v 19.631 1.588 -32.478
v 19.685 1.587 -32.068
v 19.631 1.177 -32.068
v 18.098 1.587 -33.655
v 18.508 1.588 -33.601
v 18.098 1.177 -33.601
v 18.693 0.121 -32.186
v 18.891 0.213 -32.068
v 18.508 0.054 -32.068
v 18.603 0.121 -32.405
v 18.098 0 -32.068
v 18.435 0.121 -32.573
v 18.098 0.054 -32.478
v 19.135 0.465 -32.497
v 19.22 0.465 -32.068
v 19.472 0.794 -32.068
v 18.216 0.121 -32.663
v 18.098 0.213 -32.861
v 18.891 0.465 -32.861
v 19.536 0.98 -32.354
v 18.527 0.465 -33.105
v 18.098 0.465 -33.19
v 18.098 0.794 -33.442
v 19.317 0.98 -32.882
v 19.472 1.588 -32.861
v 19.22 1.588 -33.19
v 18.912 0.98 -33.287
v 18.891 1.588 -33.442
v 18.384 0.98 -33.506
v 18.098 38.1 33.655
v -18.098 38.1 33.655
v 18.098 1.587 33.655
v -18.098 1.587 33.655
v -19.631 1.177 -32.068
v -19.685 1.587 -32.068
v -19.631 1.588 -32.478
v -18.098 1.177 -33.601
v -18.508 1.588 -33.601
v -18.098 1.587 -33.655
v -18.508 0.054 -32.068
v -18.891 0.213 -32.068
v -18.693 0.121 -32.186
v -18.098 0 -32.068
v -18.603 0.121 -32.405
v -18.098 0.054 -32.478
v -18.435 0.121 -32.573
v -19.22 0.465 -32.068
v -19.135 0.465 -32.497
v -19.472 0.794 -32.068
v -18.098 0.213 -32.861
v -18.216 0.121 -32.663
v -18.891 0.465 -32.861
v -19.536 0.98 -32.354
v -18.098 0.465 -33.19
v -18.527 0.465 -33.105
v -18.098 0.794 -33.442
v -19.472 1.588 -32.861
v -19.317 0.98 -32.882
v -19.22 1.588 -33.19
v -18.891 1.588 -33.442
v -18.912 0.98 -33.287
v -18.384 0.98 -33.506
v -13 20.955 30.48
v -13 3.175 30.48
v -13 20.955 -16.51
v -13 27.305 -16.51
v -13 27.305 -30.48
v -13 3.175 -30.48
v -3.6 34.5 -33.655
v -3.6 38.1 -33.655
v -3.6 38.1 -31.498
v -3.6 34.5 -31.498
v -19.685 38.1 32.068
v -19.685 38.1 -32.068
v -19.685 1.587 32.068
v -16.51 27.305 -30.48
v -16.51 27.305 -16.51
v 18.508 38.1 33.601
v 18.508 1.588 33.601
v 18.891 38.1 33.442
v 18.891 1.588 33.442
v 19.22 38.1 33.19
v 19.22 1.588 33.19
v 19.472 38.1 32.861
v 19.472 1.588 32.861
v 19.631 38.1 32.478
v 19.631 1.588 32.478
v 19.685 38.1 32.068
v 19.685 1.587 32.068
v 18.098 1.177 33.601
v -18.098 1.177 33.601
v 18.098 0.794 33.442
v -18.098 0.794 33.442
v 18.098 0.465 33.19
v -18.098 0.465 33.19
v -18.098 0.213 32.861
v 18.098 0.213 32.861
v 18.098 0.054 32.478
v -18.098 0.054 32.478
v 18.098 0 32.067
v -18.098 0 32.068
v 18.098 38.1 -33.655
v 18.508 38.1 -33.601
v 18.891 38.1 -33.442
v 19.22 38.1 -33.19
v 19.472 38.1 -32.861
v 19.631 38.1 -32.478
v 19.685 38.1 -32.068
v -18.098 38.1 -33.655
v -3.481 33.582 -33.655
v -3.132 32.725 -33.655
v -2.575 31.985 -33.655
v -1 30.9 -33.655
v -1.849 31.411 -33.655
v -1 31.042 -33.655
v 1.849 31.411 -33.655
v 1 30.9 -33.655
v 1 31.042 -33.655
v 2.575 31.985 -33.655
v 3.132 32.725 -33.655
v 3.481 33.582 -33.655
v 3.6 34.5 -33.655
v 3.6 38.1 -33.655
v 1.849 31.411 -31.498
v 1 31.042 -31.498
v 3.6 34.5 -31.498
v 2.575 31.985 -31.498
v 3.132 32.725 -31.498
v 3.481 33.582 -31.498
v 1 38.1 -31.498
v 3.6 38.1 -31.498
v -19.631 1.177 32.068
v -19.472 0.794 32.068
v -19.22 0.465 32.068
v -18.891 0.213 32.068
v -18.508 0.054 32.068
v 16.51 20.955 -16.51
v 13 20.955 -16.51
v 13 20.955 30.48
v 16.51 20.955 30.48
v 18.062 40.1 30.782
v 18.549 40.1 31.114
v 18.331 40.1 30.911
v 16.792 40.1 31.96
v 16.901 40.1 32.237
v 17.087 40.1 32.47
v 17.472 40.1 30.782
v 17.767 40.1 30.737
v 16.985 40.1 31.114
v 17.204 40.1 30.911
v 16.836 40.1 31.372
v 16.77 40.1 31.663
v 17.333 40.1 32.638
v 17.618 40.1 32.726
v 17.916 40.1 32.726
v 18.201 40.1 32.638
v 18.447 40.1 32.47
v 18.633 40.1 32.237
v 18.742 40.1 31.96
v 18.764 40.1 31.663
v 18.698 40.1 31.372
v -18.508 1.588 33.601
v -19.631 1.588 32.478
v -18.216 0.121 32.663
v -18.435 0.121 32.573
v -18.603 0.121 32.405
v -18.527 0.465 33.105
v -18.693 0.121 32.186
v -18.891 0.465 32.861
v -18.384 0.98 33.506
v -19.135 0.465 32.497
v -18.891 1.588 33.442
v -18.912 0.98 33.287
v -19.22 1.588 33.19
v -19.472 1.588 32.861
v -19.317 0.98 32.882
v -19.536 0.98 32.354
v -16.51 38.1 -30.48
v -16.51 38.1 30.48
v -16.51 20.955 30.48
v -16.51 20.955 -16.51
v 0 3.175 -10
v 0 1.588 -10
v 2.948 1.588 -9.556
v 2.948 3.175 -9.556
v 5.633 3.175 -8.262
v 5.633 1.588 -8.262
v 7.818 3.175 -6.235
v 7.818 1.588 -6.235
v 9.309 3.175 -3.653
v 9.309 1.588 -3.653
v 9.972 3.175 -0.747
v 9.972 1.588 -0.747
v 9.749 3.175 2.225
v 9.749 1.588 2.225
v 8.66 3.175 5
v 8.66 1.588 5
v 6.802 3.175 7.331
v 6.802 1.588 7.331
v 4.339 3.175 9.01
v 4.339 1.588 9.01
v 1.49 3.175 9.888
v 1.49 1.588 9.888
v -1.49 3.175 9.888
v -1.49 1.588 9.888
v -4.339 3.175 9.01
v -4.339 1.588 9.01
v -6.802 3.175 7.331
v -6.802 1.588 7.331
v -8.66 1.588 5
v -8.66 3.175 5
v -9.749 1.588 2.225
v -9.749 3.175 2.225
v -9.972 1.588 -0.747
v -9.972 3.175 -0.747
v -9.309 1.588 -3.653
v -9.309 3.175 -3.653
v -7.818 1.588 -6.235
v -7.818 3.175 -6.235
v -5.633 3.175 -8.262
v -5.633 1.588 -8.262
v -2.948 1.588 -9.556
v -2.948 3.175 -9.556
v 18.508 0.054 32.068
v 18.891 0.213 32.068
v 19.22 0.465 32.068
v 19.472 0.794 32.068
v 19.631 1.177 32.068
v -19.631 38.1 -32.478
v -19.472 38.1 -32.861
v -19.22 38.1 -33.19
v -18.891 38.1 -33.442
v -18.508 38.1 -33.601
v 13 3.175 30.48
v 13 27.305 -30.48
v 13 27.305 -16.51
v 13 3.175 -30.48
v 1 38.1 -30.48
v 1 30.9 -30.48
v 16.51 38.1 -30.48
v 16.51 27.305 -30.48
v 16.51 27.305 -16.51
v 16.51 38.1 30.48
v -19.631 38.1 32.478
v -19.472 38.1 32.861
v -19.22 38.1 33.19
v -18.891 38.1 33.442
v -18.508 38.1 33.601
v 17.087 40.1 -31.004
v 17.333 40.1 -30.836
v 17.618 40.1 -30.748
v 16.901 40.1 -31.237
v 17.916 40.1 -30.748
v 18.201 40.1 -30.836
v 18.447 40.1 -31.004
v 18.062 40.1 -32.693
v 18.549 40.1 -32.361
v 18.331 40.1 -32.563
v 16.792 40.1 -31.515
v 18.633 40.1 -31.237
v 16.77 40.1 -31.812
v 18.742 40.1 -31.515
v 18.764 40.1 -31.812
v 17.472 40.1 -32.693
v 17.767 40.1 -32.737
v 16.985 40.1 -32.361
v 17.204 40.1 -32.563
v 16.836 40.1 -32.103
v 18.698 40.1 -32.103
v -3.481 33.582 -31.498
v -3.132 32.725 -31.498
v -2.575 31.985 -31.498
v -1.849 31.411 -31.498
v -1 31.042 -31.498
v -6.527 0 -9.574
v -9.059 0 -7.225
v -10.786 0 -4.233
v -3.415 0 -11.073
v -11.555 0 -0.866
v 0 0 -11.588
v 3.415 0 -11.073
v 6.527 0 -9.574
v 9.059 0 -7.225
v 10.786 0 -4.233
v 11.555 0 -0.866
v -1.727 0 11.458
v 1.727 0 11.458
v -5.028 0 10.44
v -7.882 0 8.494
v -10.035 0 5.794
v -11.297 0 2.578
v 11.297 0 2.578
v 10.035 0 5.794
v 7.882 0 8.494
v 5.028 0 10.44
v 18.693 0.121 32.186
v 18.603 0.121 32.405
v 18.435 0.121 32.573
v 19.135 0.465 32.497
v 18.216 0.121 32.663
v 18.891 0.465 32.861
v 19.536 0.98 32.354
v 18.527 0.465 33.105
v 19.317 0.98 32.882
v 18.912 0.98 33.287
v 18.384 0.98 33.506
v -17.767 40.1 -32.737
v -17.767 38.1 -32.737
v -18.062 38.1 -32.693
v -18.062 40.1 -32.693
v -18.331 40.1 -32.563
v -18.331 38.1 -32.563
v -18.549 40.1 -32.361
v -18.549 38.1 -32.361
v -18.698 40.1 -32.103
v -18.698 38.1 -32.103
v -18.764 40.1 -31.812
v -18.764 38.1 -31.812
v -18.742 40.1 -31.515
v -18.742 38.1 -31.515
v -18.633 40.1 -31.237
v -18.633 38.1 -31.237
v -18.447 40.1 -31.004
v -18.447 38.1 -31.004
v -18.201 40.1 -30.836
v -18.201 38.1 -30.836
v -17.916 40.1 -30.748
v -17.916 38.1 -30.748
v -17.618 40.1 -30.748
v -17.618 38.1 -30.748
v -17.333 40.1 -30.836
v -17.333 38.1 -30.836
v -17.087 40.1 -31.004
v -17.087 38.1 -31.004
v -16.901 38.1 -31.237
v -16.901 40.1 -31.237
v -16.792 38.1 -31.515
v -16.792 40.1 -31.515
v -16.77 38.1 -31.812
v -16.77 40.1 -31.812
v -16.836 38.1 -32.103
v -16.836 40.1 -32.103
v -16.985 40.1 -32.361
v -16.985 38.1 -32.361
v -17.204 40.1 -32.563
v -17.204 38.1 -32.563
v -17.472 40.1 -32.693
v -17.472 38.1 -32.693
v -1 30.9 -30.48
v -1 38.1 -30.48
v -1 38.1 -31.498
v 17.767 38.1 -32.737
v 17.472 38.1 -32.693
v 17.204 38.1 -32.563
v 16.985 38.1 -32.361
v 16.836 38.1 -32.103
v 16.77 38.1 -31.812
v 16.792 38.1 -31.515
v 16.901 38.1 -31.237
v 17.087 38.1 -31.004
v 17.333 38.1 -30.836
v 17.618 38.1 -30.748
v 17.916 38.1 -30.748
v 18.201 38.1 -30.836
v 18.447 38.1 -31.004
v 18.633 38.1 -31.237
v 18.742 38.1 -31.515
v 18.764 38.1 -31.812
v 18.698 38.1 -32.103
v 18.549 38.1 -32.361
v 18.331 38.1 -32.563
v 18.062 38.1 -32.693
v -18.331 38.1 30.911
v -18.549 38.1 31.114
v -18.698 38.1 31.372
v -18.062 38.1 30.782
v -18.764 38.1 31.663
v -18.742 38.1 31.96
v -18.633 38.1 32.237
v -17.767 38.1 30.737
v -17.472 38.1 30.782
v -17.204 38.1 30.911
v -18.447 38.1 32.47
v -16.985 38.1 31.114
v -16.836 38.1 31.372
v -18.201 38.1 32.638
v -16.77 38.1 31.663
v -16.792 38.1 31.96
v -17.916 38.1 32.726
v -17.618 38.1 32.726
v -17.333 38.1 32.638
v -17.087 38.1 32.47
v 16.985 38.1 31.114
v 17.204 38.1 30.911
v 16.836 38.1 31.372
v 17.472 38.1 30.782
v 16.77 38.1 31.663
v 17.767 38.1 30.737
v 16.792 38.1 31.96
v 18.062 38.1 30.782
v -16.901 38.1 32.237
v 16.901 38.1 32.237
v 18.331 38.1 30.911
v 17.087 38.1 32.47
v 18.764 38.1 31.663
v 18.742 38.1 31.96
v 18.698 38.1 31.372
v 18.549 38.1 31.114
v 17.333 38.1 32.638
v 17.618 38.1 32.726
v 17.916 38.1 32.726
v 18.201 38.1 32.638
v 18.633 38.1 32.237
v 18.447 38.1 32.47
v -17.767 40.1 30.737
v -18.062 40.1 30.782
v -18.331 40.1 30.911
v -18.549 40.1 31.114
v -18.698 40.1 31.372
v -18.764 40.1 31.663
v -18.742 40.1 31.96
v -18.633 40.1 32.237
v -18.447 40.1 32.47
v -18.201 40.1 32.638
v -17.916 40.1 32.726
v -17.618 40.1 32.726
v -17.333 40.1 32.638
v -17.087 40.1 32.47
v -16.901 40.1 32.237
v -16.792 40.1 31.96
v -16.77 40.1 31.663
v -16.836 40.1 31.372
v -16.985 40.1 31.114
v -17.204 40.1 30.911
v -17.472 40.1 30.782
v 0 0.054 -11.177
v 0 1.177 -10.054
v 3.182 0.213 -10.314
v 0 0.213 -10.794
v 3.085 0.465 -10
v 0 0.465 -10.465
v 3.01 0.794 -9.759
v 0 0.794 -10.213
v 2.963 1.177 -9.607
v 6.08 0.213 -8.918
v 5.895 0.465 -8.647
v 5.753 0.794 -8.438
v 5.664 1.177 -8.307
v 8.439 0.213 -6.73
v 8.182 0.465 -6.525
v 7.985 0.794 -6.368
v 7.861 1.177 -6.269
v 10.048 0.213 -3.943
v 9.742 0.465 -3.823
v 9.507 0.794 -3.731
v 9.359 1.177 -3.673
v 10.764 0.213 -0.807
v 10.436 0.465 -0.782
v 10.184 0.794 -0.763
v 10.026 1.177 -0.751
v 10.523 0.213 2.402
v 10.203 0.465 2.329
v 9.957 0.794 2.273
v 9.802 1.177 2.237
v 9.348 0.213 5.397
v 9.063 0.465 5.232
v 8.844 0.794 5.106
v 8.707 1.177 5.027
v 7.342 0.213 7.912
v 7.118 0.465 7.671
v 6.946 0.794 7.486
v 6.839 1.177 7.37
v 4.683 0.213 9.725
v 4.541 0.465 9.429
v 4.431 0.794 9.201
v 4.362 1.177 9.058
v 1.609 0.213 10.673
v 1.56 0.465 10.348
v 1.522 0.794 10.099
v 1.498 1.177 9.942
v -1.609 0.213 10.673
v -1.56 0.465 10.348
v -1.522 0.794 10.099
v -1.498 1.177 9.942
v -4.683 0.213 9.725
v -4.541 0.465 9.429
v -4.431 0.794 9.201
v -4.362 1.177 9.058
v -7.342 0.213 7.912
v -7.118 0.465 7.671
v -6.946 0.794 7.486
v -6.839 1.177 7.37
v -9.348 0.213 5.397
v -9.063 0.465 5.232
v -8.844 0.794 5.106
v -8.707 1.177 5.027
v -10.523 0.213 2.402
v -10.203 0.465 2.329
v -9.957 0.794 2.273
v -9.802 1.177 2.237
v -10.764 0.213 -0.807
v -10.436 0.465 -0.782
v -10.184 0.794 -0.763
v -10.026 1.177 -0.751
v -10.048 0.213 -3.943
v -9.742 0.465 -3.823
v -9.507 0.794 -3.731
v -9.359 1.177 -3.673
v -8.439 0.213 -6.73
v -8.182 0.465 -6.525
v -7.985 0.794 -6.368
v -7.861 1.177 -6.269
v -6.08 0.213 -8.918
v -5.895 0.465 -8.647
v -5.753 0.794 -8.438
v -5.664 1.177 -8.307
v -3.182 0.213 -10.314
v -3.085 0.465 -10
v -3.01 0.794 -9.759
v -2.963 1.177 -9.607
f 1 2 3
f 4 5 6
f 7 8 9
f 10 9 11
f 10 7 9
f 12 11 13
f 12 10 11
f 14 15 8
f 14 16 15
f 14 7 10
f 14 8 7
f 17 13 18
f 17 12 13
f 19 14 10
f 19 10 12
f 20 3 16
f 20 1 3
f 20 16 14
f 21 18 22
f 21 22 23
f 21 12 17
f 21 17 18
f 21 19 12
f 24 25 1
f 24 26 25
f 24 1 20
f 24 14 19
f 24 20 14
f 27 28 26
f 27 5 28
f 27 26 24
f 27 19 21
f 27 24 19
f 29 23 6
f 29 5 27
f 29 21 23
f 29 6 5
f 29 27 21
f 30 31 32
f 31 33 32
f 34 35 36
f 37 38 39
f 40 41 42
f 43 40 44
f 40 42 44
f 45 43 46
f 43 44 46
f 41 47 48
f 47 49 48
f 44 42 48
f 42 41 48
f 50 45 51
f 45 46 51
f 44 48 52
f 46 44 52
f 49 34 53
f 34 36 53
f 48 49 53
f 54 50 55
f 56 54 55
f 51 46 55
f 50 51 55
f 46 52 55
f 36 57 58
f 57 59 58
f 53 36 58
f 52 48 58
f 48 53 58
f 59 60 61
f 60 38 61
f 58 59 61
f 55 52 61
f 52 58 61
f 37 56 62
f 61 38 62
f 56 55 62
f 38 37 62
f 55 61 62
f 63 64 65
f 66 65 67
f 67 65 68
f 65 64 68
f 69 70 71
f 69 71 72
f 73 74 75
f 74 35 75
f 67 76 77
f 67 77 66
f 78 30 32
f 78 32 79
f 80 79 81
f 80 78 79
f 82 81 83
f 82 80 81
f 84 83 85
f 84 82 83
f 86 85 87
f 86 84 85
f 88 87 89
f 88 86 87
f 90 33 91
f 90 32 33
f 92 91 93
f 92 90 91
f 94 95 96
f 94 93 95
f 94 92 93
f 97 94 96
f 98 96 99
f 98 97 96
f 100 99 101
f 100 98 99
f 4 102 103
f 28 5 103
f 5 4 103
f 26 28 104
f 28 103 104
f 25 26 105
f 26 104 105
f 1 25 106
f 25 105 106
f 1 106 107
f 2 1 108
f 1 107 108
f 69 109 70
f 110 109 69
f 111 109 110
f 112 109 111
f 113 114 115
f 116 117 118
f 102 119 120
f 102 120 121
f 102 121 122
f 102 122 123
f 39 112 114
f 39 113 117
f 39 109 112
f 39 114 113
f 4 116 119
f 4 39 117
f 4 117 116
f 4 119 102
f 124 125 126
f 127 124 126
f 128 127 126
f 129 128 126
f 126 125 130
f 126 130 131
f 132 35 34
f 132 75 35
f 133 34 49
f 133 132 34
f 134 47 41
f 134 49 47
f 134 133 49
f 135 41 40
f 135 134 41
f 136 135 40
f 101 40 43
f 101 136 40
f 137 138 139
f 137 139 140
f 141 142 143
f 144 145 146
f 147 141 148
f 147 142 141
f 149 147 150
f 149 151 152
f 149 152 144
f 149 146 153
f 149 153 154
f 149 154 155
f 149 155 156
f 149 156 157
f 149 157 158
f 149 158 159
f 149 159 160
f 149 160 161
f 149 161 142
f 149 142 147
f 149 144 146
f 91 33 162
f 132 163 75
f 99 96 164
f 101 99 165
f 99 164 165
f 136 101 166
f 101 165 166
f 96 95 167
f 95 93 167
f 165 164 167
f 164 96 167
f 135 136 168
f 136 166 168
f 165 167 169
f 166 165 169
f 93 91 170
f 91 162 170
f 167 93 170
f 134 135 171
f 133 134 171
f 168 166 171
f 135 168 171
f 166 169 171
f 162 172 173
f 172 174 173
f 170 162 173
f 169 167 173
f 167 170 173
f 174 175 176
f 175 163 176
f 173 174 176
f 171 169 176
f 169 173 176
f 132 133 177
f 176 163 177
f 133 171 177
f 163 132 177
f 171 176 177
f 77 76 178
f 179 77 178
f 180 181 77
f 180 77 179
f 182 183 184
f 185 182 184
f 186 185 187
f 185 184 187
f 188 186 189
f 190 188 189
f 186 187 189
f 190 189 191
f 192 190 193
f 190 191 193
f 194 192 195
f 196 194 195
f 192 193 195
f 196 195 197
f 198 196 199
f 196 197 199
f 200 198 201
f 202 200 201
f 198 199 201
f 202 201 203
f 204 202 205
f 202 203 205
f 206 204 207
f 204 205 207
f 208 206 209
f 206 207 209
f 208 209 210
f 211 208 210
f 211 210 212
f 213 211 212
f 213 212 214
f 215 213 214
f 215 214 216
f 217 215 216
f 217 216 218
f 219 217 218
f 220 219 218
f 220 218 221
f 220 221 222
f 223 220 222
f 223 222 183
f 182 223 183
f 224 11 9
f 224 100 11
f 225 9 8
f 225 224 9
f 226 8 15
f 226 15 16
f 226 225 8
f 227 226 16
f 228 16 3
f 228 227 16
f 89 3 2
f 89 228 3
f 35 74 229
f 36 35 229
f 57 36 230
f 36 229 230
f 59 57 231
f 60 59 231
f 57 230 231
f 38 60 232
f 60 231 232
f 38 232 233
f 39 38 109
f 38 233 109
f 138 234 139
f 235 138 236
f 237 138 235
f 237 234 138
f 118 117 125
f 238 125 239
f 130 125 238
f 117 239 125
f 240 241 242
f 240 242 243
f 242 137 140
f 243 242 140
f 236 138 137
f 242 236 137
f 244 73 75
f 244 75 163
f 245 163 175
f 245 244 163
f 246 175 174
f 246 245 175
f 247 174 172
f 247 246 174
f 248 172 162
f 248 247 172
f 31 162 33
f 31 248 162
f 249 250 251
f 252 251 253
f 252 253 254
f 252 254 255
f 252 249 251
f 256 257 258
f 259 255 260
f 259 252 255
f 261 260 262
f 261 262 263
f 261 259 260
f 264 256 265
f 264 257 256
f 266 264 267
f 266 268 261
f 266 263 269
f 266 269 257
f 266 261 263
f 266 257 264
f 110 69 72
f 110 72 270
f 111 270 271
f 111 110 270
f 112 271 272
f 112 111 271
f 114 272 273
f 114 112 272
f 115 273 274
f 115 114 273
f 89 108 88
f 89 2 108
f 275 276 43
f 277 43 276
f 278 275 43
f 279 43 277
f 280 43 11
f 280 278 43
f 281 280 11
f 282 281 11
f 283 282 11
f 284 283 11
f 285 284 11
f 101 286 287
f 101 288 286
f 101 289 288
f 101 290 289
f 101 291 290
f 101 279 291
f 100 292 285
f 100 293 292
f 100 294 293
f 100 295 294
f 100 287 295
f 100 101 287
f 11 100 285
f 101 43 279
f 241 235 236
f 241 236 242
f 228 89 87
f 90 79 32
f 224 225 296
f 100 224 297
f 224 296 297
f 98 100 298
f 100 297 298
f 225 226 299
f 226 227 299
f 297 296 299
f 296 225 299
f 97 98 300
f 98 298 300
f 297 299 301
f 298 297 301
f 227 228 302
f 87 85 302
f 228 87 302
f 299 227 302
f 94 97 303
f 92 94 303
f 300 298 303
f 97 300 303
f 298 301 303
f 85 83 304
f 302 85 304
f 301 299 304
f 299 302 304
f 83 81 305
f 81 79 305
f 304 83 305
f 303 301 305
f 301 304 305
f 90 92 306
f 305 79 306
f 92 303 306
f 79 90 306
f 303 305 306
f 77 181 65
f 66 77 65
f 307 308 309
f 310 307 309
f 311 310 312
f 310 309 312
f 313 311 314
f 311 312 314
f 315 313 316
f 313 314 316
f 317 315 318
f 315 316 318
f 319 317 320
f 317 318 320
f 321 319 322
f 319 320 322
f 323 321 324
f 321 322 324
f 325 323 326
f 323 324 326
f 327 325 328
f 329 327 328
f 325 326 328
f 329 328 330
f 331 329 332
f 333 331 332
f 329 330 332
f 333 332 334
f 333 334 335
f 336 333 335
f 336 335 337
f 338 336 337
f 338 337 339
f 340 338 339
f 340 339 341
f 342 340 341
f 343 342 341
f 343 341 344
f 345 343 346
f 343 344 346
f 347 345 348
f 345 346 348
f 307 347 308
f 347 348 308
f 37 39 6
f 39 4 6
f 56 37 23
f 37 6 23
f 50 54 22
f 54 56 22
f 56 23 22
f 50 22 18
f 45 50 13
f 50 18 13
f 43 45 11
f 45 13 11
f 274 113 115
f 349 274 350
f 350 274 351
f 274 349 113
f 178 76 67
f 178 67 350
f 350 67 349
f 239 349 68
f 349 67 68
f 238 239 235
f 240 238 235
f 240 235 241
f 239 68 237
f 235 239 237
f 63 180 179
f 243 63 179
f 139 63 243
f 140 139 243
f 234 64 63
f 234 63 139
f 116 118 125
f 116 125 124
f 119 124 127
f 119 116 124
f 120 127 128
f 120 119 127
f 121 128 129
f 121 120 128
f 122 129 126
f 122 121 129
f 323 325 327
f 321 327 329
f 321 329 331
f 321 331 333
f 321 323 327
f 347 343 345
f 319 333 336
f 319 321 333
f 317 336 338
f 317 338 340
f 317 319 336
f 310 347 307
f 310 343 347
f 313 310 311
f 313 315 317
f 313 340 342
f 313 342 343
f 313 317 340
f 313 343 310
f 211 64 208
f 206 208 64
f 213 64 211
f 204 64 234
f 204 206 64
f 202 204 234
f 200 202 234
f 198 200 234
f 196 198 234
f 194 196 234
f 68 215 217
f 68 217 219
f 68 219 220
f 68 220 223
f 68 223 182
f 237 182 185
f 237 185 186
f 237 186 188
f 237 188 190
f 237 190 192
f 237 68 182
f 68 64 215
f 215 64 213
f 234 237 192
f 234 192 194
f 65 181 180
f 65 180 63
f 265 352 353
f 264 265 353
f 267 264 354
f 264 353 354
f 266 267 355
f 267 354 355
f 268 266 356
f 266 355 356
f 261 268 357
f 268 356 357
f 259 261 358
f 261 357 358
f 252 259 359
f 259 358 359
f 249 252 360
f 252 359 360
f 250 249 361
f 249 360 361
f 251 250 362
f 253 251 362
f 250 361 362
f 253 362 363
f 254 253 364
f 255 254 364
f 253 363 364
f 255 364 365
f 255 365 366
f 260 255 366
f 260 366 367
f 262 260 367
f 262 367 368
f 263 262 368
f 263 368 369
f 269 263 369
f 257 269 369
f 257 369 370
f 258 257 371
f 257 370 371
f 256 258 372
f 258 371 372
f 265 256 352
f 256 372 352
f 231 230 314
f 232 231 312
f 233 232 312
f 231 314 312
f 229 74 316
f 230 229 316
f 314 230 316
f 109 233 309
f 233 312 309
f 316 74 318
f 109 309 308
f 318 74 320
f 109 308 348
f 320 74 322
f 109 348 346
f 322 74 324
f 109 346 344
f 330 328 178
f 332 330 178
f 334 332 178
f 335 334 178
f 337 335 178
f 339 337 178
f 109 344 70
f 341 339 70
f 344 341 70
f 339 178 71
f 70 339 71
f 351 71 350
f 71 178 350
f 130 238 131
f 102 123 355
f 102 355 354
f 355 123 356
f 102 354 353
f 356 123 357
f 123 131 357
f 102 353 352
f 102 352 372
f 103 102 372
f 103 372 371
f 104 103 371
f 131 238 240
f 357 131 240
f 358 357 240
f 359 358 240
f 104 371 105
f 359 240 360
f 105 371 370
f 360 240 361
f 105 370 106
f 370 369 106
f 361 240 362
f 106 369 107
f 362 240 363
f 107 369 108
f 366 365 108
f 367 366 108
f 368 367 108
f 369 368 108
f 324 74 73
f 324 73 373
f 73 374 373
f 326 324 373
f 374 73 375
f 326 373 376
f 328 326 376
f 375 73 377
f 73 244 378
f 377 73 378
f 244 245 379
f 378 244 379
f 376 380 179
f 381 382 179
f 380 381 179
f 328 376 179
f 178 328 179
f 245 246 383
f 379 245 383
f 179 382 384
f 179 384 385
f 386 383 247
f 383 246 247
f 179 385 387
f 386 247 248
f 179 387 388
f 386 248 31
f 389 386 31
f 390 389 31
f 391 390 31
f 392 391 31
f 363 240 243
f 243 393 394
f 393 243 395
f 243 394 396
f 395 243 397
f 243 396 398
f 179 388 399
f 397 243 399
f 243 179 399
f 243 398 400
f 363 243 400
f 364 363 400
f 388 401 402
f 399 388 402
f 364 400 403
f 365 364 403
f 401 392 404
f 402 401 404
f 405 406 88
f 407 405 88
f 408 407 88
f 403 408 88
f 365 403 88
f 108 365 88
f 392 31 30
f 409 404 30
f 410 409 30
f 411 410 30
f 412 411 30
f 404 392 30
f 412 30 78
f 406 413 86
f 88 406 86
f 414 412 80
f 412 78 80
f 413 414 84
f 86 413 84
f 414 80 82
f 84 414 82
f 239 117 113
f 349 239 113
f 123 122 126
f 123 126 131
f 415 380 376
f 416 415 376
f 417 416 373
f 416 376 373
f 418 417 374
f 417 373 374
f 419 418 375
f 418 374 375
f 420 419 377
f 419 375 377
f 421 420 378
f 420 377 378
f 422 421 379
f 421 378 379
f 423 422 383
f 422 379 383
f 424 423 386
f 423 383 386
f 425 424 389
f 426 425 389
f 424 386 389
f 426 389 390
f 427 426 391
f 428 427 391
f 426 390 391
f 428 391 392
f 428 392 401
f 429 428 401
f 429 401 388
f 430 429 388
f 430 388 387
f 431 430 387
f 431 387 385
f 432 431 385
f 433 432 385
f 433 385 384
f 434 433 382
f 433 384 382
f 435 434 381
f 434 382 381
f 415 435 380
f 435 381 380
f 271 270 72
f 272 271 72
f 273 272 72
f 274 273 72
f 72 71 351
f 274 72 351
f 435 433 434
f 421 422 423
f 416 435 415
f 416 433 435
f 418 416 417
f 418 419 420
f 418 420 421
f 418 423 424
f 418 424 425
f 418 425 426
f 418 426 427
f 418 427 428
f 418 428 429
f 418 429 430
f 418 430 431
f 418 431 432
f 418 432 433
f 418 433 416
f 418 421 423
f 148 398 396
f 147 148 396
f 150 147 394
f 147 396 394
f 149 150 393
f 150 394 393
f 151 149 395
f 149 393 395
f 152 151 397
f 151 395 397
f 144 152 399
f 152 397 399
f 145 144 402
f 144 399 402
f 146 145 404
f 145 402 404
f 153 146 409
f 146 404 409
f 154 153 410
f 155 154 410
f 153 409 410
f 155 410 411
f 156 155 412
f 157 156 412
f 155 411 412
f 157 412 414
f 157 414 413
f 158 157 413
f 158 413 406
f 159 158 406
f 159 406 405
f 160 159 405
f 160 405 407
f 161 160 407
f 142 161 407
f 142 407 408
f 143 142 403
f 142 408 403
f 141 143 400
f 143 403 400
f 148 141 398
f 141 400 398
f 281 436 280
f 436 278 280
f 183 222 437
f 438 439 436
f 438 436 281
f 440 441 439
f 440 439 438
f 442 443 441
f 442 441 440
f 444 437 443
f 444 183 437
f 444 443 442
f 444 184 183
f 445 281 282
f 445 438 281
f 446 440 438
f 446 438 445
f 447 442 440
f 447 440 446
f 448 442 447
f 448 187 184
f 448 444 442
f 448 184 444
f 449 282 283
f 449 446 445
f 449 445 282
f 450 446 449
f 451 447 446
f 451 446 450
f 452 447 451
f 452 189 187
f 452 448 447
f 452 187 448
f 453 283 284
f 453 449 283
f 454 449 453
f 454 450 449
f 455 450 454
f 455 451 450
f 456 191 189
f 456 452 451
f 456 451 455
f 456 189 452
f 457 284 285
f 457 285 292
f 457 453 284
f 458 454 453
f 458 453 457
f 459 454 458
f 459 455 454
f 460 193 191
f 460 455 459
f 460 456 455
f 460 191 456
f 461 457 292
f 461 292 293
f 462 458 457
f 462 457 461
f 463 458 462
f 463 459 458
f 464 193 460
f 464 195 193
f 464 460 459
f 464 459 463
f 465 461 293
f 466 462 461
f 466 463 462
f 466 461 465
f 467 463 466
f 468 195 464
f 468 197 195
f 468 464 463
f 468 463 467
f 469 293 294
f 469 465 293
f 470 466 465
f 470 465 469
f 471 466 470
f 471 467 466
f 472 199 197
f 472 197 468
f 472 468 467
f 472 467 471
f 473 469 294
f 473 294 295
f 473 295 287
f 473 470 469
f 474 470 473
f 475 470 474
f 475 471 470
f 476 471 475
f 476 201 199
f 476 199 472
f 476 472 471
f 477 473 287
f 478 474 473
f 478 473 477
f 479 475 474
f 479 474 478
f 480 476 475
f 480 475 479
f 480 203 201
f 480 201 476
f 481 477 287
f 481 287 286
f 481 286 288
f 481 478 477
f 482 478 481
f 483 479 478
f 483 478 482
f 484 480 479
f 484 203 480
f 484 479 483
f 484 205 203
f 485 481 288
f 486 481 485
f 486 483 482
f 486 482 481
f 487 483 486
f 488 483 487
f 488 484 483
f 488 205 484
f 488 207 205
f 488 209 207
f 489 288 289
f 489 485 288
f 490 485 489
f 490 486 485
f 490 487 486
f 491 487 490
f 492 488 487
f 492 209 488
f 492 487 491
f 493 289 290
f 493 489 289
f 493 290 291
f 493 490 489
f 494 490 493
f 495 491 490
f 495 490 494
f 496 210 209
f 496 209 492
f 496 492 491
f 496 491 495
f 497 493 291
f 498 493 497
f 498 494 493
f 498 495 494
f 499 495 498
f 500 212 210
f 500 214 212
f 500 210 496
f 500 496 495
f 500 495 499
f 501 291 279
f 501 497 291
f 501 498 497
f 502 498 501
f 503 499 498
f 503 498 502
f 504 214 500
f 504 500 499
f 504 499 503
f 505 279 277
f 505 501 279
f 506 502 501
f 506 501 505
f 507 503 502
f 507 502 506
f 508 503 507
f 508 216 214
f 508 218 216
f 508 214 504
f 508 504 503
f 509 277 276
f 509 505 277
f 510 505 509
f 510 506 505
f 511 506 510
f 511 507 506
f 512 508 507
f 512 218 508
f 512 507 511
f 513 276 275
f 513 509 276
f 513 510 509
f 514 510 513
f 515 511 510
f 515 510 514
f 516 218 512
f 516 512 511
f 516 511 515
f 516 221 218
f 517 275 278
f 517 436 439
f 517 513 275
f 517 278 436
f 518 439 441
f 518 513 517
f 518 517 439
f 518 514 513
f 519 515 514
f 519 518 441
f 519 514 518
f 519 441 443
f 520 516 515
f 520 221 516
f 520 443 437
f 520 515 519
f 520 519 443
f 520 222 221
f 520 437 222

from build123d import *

# Parameters (mm, degrees)
SKETCH1_W                     = 33.02
SKETCH1_H                     = 60.96
BASE_DEPTH                    = 3.175
SKETCH2_W                     = 3.51
SKETCH2_H                     = 60.96
BATTERY_SIDES_DEPTH           = 17.78
SKETCH3_W                     = 39.37
SKETCH3_H                     = 67.31
SKETCH3_W_2                   = 33.02
SKETCH3_H_2                   = 60.96
OUTER_CASING_DEPTH            = 38.1
BATTERY_PUSH_HOLE_REACH       = 56.514
SKETCH4_R                     = 10
FILLET1_R                     = 1.5875
SKETCH5_R                     = 1
ALIGNMENT_PEGS_DEPTH          = 2
ATTACHMENT_NARROW_POINT_REACH = 82.785
SKETCH6_W                     = 2
SKETCH6_H                     = 7.2
CUT_EXTRUDE4_DEPTH            = 2.157
SKETCH9_W                     = 3.51
SKETCH9_H                     = 13.97
BOSS_EXTRUDE5_DEPTH           = 6.35


with BuildPart() as part:
    # Sketch1 → Base (new body)
    with BuildSketch(Plane(origin=(0, 0, 0), x_dir=(1, 0, 0), z_dir=(0, 1, 0))):
        Rectangle(SKETCH1_W, SKETCH1_H)
        Polygon((-16.51, 30.48), (16.51, 30.48), (16.51, -30.48), align=None)
    extrude(amount=BASE_DEPTH)

    # Sketch2 → Battery-Sides (add)
    with BuildSketch(Plane(origin=(0, 3.175, 0), x_dir=(1, 0, 0), z_dir=(0, 1, 0))):
        with Locations((-14.755, 0)):
            Rectangle(SKETCH2_W, SKETCH2_H)
        with Locations((14.755, 0)):
            Rectangle(SKETCH2_W, SKETCH2_H)
    extrude(amount=BATTERY_SIDES_DEPTH)

    # Sketch3 → Outer-Casing (add)
    with BuildSketch(Plane.XZ):
        Rectangle(SKETCH3_W, SKETCH3_H)
        Rectangle(SKETCH3_W_2, SKETCH3_H_2, mode=Mode.SUBTRACT)
    extrude(amount=-OUTER_CASING_DEPTH)

    # Sketch4 → Battery-push-hole (cut, up to next)
    with BuildSketch(Plane.XZ, mode=Mode.PRIVATE) as battery_push_hole_sk1:
        with Locations(Location((0, 0, 0), (0, 0, 270))):
            Circle(SKETCH4_R)
    battery_push_hole_tool1 = extrude(battery_push_hole_sk1.sketch, amount=-BATTERY_PUSH_HOLE_REACH, mode=Mode.PRIVATE) & part.part
    add(battery_push_hole_tool1.solids().sort_by_distance((0, 0, 0))[0], mode=Mode.SUBTRACT)

    # Fillet1
    fillet1_edges = [part.edges().sort_by_distance(p)[0] for p in [
        (19.685, 19.05, 33.655),
        (19.685, 19.05, -33.655),
        (-19.685, 19.05, -33.655),
        (-19.685, 19.05, 33.655),
        (19.685, 0, 0),
        (0, 0, 33.655),
        (-19.685, 0, 0),
        (0, 0, -33.655),
        (0, 0, 10),
    ]]
    fillet(fillet1_edges, radius=FILLET1_R)

    # Sketch5 → Alignment Pegs (add)
    with BuildSketch(Plane(origin=(0, 38.1, 0), x_dir=(1, 0, 0), z_dir=(0, 1, 0))):
        with Locations(Location((-17.767235857, 31.737235857, 0), (0, 0, 90))):
            Circle(SKETCH5_R)
        with Locations(Location((-17.767235857, -31.737235857, 0), (0, 0, 90))):
            Circle(SKETCH5_R)
        with Locations(Location((17.767235857, 31.737235857, 0), (0, 0, 90))):
            Circle(SKETCH5_R)
        with Locations(Location((17.767235857, -31.737235857, 0), (0, 0, 90))):
            Circle(SKETCH5_R)
    extrude(amount=ALIGNMENT_PEGS_DEPTH)

    # Sketch6 → Attachment Narrow Point (cut, up to next)
    with BuildSketch(Plane(origin=(0, 0, -33.655), x_dir=(-1, 0, 0), z_dir=(0, 0, -1)), mode=Mode.PRIVATE) as attachment_narrow_point_sk1:
        with Locations((0, 34.5)):
            Rectangle(SKETCH6_W, SKETCH6_H)
    attachment_narrow_point_tool1 = extrude(attachment_narrow_point_sk1.sketch, amount=-ATTACHMENT_NARROW_POINT_REACH, mode=Mode.PRIVATE) & part.part
    add(attachment_narrow_point_tool1.solids().sort_by_distance((0, 34.5, -33.655))[0], mode=Mode.SUBTRACT)

    # Sketch8 → Cut-Extrude4 (cut)
    with BuildSketch(Plane.XY.offset(-33.655)):
        with BuildLine():
            ThreePointArc((1, 31.041676707), (2.877498914, 32.336669235), (3.6, 34.5))
            Line((3.6, 34.5), (3.6, 38.1))
            Line((3.6, 38.1), (1, 38.1))
            Line((1, 38.1), (1, 37.958323293))
            Line((1, 37.958323293), (1, 31.041676707))
        make_face()
        with BuildLine():
            ThreePointArc((-3.6, 34.5), (-2.877498914, 32.336669235), (-1, 31.041676707))
            Line((-1, 31.041676707), (-1, 37.958323293))
            Line((-1, 37.958323293), (-1, 38.1))
            Line((-1, 38.1), (-3.6, 38.1))
            Line((-3.6, 38.1), (-3.6, 34.5))
        make_face()
    extrude(amount=CUT_EXTRUDE4_DEPTH, mode=Mode.SUBTRACT)

    # Sketch9 → Boss-Extrude5 (add)
    with BuildSketch(Plane(origin=(0, 20.955, 0), x_dir=(1, 0, 0), z_dir=(0, 1, 0))):
        with Locations((-14.755, 23.495)):
            Rectangle(SKETCH9_W, SKETCH9_H)
        with Locations((14.755, 23.495)):
            Rectangle(SKETCH9_W, SKETCH9_H)
    extrude(amount=BOSS_EXTRUDE5_DEPTH)


solid = part.part
